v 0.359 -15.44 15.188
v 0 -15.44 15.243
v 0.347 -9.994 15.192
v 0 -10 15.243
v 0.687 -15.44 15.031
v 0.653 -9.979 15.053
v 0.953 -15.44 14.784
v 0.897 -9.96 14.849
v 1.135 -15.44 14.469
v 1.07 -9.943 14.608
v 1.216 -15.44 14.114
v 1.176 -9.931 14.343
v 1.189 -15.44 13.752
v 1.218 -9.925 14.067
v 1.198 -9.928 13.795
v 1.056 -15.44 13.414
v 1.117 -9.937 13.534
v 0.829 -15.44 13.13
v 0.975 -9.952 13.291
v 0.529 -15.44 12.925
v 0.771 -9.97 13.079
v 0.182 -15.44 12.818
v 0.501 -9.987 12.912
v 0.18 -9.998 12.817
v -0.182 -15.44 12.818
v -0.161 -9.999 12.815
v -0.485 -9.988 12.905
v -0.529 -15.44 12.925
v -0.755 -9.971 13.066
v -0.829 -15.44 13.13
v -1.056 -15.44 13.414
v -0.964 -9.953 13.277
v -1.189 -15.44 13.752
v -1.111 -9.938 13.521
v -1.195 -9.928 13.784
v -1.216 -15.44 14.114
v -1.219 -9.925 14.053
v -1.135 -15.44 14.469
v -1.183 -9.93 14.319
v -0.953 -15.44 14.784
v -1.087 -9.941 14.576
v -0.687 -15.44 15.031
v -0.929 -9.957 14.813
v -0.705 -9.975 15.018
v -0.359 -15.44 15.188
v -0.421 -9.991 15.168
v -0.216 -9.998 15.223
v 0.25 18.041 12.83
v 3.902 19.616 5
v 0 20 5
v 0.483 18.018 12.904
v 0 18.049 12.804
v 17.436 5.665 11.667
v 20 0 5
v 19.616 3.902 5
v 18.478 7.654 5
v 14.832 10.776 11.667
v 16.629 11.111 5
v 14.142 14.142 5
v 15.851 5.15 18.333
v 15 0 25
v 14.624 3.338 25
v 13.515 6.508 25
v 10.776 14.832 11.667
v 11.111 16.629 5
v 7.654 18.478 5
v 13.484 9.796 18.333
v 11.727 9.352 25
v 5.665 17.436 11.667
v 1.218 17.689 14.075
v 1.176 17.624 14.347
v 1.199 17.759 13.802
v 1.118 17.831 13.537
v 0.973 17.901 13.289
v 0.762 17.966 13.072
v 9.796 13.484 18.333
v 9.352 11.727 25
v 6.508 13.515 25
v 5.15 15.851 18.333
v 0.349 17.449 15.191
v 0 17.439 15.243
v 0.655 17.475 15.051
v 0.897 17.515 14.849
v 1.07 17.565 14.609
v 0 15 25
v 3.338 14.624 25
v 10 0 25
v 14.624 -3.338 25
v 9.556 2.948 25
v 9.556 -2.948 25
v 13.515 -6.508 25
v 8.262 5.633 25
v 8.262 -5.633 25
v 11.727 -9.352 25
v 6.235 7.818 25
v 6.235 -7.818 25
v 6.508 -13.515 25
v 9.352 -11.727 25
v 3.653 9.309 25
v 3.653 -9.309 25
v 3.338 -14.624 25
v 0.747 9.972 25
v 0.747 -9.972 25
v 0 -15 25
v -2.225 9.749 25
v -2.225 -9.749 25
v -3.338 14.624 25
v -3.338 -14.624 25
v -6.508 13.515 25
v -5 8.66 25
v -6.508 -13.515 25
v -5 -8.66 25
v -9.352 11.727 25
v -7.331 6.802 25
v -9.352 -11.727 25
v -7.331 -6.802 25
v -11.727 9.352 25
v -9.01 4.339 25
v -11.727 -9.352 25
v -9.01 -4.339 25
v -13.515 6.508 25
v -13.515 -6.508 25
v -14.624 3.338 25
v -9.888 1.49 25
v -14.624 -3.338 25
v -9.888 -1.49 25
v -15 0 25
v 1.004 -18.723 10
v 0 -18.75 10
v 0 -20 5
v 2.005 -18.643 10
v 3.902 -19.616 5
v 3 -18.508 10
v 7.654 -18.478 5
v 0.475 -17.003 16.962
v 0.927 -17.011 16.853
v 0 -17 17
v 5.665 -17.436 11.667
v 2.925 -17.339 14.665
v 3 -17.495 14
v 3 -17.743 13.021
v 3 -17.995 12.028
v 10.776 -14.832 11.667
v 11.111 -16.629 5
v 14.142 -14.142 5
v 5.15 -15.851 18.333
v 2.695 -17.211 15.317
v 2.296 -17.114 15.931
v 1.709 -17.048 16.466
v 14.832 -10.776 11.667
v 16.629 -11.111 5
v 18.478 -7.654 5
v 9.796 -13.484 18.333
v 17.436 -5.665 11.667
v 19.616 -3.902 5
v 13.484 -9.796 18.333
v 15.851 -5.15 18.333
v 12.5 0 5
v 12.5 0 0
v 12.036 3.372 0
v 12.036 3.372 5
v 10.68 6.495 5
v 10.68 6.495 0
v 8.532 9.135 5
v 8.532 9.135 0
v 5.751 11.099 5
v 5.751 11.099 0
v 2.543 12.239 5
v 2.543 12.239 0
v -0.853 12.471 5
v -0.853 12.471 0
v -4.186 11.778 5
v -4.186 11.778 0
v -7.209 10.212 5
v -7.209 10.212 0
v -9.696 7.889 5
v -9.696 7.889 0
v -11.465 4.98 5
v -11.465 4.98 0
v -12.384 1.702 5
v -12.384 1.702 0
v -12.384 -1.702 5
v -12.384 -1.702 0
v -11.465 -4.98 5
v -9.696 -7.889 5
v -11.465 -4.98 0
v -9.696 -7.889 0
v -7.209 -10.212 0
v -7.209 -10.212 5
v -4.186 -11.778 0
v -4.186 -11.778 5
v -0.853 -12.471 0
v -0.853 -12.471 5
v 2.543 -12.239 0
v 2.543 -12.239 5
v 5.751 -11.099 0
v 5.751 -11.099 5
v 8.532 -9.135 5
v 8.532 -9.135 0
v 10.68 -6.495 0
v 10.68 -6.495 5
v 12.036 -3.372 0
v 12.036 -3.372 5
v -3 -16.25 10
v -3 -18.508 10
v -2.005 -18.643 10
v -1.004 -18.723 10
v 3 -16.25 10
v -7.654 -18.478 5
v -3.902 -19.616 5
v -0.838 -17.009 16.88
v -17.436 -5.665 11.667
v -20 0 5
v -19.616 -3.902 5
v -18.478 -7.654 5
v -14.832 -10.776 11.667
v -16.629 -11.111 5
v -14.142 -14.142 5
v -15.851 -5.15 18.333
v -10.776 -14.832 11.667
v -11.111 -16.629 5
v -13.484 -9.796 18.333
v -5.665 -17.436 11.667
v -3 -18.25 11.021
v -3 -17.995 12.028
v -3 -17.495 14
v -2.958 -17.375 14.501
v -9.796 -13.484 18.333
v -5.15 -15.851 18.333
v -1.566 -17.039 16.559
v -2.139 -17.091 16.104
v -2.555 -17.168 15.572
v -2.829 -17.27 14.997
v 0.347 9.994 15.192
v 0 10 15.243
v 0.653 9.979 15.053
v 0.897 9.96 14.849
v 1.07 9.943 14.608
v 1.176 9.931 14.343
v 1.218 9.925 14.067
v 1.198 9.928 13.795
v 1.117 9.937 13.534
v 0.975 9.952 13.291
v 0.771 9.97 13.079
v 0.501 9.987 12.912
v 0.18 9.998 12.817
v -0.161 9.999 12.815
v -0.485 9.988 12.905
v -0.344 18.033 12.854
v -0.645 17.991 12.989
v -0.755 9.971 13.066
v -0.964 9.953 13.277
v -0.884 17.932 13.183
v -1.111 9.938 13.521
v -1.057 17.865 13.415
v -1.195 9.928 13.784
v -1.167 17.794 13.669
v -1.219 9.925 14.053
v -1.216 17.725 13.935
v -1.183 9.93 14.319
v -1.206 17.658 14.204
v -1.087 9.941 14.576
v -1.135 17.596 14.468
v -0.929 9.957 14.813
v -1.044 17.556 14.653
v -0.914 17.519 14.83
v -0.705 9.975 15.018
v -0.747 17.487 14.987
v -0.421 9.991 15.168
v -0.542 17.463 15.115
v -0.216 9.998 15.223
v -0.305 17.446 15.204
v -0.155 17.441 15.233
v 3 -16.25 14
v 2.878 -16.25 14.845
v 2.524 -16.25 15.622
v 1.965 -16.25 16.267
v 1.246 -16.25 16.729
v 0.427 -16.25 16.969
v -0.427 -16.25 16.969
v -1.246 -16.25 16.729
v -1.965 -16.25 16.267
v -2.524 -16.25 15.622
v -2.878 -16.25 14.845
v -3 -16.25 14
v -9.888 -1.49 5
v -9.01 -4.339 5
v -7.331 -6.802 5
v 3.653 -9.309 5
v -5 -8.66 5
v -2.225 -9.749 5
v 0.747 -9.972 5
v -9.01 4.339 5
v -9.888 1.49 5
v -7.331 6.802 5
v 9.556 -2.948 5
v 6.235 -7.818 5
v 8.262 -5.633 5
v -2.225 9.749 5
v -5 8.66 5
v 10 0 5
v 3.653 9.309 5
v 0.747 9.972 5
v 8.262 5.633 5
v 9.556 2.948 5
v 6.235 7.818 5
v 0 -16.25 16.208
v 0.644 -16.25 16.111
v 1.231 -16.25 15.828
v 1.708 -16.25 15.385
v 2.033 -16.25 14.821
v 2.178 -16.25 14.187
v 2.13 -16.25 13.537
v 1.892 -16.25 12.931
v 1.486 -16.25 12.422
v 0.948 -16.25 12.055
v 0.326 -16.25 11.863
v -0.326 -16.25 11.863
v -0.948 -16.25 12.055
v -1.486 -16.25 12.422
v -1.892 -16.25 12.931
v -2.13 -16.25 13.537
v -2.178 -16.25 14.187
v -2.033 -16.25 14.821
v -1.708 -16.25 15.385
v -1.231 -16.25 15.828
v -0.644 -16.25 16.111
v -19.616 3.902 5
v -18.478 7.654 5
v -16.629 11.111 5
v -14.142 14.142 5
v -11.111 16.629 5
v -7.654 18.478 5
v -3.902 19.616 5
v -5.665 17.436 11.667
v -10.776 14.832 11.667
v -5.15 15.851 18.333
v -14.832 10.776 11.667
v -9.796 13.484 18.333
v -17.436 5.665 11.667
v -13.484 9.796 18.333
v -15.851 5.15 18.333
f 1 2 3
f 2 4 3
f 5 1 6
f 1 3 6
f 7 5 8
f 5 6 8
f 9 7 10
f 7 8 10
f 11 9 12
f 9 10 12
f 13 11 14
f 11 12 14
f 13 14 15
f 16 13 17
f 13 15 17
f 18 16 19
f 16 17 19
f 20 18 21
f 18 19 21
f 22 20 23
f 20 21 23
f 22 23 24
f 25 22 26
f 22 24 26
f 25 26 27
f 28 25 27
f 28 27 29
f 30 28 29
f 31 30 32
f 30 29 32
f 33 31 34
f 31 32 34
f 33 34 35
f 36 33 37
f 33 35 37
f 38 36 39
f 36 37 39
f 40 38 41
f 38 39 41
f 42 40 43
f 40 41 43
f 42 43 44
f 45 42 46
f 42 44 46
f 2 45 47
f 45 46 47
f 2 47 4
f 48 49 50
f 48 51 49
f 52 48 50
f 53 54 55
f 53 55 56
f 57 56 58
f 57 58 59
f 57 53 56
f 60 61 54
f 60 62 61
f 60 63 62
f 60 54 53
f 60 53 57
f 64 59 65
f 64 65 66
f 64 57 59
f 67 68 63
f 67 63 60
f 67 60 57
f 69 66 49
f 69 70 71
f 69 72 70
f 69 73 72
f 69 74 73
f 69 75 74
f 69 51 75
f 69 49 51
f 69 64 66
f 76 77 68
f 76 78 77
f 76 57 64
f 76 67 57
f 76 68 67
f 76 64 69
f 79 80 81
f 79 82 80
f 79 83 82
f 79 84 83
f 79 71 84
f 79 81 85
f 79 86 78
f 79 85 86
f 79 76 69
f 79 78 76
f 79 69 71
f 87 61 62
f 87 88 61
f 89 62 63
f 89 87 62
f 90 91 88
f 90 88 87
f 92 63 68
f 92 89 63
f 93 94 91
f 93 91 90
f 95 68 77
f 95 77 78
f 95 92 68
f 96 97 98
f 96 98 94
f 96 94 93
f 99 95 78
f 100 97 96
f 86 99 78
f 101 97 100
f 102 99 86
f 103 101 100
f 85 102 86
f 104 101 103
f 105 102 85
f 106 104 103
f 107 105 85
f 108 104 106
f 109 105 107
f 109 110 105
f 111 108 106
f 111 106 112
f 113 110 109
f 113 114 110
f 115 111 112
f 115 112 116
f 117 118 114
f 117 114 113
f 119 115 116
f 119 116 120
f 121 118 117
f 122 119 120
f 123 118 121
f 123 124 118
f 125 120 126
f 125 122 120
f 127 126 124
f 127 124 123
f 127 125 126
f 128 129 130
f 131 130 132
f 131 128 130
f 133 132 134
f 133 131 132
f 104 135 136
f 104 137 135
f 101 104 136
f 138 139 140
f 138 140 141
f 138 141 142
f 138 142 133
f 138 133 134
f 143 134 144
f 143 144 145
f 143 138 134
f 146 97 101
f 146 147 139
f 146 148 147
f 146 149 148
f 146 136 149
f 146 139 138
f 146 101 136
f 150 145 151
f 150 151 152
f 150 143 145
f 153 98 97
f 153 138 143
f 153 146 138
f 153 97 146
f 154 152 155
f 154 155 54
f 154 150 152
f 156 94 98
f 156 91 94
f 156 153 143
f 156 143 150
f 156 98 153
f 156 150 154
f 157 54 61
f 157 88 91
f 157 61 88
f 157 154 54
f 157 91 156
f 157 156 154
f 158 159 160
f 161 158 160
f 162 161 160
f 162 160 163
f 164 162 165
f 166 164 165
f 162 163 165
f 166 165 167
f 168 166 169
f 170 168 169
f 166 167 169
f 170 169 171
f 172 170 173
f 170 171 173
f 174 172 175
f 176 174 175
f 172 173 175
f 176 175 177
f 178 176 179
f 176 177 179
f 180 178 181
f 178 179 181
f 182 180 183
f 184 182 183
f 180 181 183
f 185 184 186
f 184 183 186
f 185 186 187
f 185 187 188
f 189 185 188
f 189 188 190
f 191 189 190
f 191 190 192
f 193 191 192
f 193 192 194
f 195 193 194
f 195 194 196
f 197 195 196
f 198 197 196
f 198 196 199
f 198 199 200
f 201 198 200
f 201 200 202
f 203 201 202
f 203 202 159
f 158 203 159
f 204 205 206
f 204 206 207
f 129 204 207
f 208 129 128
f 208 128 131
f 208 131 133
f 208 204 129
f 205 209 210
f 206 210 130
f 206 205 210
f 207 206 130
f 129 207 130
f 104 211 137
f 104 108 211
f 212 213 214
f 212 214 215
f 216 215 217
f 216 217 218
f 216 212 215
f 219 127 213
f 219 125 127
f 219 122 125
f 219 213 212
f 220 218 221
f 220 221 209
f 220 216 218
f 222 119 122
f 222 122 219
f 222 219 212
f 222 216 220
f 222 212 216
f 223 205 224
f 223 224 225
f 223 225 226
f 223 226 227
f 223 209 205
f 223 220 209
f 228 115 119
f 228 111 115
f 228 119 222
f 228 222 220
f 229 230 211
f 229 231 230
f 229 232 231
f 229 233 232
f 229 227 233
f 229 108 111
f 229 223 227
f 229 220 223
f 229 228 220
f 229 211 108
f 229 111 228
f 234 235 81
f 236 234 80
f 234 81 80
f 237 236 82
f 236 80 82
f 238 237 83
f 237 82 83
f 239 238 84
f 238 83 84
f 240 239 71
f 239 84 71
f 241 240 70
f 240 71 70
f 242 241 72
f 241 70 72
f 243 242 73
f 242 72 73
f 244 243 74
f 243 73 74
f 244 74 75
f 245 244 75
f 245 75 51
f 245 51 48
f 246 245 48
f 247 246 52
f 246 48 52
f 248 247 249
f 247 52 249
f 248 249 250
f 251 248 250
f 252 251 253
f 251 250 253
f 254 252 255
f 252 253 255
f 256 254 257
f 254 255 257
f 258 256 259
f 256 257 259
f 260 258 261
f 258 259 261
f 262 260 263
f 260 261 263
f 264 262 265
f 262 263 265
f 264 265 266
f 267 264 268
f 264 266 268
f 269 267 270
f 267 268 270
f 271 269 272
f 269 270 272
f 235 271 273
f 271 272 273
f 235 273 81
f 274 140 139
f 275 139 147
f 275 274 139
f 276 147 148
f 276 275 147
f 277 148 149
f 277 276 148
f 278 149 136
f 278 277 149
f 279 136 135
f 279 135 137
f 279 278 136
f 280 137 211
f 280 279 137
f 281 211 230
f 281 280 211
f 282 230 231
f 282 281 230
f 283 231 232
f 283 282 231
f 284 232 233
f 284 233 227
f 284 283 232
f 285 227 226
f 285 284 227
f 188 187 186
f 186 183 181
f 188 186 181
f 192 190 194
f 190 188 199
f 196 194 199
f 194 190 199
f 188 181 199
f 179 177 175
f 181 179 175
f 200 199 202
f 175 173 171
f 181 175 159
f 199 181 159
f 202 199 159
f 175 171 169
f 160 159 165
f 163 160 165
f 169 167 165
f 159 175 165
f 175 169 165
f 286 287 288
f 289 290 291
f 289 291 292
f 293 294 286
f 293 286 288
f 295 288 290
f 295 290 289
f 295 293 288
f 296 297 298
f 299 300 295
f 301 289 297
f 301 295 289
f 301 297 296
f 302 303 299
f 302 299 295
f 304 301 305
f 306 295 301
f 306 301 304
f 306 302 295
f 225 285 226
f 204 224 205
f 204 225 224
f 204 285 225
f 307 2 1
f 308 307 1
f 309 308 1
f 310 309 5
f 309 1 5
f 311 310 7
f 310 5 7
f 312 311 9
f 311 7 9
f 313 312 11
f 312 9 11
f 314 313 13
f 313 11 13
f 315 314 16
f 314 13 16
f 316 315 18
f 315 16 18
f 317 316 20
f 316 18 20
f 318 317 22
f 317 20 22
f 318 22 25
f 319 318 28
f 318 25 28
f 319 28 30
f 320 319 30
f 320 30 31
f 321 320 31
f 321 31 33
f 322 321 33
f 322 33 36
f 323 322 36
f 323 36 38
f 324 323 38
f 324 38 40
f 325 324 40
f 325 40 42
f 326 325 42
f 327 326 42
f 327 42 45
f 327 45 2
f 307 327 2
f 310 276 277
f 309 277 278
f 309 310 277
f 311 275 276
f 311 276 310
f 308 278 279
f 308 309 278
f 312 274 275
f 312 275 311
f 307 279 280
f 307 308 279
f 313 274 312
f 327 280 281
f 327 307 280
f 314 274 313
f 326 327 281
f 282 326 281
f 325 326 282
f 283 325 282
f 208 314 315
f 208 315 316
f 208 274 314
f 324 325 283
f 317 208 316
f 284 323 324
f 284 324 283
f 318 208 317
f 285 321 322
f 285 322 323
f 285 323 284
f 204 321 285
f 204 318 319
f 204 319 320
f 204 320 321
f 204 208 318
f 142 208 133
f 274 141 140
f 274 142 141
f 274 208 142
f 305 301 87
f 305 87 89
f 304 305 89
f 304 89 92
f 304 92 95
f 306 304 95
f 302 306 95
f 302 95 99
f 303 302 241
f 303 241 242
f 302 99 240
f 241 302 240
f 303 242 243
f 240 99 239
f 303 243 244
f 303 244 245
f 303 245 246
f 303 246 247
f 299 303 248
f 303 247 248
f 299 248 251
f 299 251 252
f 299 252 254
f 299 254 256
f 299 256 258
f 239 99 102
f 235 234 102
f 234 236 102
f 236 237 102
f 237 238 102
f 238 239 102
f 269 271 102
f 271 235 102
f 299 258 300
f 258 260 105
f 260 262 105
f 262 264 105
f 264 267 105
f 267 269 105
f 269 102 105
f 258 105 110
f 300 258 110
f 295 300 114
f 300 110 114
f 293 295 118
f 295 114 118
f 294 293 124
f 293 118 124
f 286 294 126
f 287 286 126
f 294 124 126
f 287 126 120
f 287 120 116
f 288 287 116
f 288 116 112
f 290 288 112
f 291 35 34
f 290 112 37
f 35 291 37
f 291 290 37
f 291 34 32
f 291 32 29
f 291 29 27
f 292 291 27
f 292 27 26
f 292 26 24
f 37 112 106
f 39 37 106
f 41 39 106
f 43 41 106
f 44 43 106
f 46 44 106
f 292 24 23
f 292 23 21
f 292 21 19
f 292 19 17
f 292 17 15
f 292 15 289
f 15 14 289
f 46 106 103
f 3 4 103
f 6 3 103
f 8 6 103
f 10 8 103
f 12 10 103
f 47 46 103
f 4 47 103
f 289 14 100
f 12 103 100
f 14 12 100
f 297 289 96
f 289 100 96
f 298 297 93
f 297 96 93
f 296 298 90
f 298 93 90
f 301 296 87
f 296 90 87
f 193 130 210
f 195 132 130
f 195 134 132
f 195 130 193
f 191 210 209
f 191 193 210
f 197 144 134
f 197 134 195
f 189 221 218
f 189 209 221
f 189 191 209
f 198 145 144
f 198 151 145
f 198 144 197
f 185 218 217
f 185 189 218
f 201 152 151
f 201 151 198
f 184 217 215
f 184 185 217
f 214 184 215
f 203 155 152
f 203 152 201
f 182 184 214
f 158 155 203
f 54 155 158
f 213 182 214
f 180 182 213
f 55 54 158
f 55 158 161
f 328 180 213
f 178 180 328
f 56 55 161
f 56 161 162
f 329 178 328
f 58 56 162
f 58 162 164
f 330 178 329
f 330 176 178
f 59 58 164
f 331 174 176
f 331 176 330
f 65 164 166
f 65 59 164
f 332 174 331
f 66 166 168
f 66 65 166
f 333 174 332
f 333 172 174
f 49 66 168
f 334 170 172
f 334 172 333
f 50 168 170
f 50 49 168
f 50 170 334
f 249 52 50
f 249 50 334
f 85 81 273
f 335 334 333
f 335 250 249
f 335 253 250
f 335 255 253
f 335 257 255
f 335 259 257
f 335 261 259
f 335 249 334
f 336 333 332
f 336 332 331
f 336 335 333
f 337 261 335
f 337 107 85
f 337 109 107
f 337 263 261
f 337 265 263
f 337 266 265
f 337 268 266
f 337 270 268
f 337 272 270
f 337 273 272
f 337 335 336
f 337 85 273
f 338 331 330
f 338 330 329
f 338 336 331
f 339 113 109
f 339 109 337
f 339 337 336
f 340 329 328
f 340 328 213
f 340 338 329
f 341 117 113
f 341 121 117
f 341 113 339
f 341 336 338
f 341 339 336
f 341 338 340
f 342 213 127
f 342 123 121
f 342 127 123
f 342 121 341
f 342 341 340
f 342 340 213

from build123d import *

# Parameters (mm, degrees)
SKETCH1_R                                         = 12.5
BOSS_EXTRUDE1_DEPTH                               = 5
SKETCH4_R                                         = 10
CUT_EXTRUDE1_DEPTH                                = 20
CUT_EXTRUDE2_START                                = -16.25
CUT_EXTRUDE2_DEPTH                                = 5
CSK_FOR_2_FLAT_HEAD_MACHINE_SCREW_100_D           = 2.4384
CSK_FOR_2_FLAT_HEAD_MACHINE_SCREW_100_CSINK_D     = 4.3688
CSK_FOR_2_FLAT_HEAD_MACHINE_SCREW_100_CSINK_ANGLE = 100


with BuildPart() as part:
    # Sketch1 → Boss-Extrude1 (new body)
    with BuildSketch(Plane.XY):
        Circle(SKETCH1_R)
    extrude(amount=BOSS_EXTRUDE1_DEPTH)

    # Sweep1: sweep along a curve in space
    with BuildLine() as sweep1_path:
        ThreePointArc((12.5, 0, 5), (8.838834765, 8.838834765, 5), (0, 12.5, 5))
        ThreePointArc((0, 12.5, 5), (-8.838834765, 8.838834765, 5), (-12.5, 0, 5))
        ThreePointArc((-12.5, 0, 5), (-8.838834765, -8.838834765, 5), (0, -12.5, 5))
        ThreePointArc((0, -12.5, 5), (8.838834765, -8.838834765, 5), (12.5, 0, 5))
    # Sketch3 → Sweep1 (sweep)
    with BuildSketch(Plane(origin=(0, 0, 0), x_dir=(1, 0, 0), z_dir=(0, 1, 0))):
        Polygon((0, -5), (-20, -5), (-15, -25), (0, -25), align=None)
    sweep(path=sweep1_path.line)

    # Sketch4 → Cut-Extrude1 (cut)
    with BuildSketch(Plane.XY.offset(25)):
        Circle(SKETCH4_R)
    extrude(amount=-CUT_EXTRUDE1_DEPTH, mode=Mode.SUBTRACT)

    # Sketch11 → Cut-Extrude2 (cut)
    with BuildSketch(Plane(origin=(0, 0, 0), x_dir=(1, 0, 0), z_dir=(0, 1, 0)).offset(CUT_EXTRUDE2_START)):
        with BuildLine():
            Line((-3, -10), (3, -10))
            Line((3, -10), (3, -14))
            ThreePointArc((3, -14), (0, -17), (-3, -14))
            Line((-3, -14), (-3, -10))
        make_face()
    extrude(amount=-CUT_EXTRUDE2_DEPTH, mode=Mode.SUBTRACT)

    # CSK for #2 Flat Head Machine Screw (100)2 (through all)
    with Locations(Plane(origin=(0, -16.25, 14.023346871), x_dir=(0, 0, -1), z_dir=(0, -1, 0))):
        with Locations((0, 0)):
            CounterSinkHole(CSK_FOR_2_FLAT_HEAD_MACHINE_SCREW_100_D / 2, CSK_FOR_2_FLAT_HEAD_MACHINE_SCREW_100_CSINK_D / 2, counter_sink_angle=CSK_FOR_2_FLAT_HEAD_MACHINE_SCREW_100_CSINK_ANGLE)


solid = part.part
